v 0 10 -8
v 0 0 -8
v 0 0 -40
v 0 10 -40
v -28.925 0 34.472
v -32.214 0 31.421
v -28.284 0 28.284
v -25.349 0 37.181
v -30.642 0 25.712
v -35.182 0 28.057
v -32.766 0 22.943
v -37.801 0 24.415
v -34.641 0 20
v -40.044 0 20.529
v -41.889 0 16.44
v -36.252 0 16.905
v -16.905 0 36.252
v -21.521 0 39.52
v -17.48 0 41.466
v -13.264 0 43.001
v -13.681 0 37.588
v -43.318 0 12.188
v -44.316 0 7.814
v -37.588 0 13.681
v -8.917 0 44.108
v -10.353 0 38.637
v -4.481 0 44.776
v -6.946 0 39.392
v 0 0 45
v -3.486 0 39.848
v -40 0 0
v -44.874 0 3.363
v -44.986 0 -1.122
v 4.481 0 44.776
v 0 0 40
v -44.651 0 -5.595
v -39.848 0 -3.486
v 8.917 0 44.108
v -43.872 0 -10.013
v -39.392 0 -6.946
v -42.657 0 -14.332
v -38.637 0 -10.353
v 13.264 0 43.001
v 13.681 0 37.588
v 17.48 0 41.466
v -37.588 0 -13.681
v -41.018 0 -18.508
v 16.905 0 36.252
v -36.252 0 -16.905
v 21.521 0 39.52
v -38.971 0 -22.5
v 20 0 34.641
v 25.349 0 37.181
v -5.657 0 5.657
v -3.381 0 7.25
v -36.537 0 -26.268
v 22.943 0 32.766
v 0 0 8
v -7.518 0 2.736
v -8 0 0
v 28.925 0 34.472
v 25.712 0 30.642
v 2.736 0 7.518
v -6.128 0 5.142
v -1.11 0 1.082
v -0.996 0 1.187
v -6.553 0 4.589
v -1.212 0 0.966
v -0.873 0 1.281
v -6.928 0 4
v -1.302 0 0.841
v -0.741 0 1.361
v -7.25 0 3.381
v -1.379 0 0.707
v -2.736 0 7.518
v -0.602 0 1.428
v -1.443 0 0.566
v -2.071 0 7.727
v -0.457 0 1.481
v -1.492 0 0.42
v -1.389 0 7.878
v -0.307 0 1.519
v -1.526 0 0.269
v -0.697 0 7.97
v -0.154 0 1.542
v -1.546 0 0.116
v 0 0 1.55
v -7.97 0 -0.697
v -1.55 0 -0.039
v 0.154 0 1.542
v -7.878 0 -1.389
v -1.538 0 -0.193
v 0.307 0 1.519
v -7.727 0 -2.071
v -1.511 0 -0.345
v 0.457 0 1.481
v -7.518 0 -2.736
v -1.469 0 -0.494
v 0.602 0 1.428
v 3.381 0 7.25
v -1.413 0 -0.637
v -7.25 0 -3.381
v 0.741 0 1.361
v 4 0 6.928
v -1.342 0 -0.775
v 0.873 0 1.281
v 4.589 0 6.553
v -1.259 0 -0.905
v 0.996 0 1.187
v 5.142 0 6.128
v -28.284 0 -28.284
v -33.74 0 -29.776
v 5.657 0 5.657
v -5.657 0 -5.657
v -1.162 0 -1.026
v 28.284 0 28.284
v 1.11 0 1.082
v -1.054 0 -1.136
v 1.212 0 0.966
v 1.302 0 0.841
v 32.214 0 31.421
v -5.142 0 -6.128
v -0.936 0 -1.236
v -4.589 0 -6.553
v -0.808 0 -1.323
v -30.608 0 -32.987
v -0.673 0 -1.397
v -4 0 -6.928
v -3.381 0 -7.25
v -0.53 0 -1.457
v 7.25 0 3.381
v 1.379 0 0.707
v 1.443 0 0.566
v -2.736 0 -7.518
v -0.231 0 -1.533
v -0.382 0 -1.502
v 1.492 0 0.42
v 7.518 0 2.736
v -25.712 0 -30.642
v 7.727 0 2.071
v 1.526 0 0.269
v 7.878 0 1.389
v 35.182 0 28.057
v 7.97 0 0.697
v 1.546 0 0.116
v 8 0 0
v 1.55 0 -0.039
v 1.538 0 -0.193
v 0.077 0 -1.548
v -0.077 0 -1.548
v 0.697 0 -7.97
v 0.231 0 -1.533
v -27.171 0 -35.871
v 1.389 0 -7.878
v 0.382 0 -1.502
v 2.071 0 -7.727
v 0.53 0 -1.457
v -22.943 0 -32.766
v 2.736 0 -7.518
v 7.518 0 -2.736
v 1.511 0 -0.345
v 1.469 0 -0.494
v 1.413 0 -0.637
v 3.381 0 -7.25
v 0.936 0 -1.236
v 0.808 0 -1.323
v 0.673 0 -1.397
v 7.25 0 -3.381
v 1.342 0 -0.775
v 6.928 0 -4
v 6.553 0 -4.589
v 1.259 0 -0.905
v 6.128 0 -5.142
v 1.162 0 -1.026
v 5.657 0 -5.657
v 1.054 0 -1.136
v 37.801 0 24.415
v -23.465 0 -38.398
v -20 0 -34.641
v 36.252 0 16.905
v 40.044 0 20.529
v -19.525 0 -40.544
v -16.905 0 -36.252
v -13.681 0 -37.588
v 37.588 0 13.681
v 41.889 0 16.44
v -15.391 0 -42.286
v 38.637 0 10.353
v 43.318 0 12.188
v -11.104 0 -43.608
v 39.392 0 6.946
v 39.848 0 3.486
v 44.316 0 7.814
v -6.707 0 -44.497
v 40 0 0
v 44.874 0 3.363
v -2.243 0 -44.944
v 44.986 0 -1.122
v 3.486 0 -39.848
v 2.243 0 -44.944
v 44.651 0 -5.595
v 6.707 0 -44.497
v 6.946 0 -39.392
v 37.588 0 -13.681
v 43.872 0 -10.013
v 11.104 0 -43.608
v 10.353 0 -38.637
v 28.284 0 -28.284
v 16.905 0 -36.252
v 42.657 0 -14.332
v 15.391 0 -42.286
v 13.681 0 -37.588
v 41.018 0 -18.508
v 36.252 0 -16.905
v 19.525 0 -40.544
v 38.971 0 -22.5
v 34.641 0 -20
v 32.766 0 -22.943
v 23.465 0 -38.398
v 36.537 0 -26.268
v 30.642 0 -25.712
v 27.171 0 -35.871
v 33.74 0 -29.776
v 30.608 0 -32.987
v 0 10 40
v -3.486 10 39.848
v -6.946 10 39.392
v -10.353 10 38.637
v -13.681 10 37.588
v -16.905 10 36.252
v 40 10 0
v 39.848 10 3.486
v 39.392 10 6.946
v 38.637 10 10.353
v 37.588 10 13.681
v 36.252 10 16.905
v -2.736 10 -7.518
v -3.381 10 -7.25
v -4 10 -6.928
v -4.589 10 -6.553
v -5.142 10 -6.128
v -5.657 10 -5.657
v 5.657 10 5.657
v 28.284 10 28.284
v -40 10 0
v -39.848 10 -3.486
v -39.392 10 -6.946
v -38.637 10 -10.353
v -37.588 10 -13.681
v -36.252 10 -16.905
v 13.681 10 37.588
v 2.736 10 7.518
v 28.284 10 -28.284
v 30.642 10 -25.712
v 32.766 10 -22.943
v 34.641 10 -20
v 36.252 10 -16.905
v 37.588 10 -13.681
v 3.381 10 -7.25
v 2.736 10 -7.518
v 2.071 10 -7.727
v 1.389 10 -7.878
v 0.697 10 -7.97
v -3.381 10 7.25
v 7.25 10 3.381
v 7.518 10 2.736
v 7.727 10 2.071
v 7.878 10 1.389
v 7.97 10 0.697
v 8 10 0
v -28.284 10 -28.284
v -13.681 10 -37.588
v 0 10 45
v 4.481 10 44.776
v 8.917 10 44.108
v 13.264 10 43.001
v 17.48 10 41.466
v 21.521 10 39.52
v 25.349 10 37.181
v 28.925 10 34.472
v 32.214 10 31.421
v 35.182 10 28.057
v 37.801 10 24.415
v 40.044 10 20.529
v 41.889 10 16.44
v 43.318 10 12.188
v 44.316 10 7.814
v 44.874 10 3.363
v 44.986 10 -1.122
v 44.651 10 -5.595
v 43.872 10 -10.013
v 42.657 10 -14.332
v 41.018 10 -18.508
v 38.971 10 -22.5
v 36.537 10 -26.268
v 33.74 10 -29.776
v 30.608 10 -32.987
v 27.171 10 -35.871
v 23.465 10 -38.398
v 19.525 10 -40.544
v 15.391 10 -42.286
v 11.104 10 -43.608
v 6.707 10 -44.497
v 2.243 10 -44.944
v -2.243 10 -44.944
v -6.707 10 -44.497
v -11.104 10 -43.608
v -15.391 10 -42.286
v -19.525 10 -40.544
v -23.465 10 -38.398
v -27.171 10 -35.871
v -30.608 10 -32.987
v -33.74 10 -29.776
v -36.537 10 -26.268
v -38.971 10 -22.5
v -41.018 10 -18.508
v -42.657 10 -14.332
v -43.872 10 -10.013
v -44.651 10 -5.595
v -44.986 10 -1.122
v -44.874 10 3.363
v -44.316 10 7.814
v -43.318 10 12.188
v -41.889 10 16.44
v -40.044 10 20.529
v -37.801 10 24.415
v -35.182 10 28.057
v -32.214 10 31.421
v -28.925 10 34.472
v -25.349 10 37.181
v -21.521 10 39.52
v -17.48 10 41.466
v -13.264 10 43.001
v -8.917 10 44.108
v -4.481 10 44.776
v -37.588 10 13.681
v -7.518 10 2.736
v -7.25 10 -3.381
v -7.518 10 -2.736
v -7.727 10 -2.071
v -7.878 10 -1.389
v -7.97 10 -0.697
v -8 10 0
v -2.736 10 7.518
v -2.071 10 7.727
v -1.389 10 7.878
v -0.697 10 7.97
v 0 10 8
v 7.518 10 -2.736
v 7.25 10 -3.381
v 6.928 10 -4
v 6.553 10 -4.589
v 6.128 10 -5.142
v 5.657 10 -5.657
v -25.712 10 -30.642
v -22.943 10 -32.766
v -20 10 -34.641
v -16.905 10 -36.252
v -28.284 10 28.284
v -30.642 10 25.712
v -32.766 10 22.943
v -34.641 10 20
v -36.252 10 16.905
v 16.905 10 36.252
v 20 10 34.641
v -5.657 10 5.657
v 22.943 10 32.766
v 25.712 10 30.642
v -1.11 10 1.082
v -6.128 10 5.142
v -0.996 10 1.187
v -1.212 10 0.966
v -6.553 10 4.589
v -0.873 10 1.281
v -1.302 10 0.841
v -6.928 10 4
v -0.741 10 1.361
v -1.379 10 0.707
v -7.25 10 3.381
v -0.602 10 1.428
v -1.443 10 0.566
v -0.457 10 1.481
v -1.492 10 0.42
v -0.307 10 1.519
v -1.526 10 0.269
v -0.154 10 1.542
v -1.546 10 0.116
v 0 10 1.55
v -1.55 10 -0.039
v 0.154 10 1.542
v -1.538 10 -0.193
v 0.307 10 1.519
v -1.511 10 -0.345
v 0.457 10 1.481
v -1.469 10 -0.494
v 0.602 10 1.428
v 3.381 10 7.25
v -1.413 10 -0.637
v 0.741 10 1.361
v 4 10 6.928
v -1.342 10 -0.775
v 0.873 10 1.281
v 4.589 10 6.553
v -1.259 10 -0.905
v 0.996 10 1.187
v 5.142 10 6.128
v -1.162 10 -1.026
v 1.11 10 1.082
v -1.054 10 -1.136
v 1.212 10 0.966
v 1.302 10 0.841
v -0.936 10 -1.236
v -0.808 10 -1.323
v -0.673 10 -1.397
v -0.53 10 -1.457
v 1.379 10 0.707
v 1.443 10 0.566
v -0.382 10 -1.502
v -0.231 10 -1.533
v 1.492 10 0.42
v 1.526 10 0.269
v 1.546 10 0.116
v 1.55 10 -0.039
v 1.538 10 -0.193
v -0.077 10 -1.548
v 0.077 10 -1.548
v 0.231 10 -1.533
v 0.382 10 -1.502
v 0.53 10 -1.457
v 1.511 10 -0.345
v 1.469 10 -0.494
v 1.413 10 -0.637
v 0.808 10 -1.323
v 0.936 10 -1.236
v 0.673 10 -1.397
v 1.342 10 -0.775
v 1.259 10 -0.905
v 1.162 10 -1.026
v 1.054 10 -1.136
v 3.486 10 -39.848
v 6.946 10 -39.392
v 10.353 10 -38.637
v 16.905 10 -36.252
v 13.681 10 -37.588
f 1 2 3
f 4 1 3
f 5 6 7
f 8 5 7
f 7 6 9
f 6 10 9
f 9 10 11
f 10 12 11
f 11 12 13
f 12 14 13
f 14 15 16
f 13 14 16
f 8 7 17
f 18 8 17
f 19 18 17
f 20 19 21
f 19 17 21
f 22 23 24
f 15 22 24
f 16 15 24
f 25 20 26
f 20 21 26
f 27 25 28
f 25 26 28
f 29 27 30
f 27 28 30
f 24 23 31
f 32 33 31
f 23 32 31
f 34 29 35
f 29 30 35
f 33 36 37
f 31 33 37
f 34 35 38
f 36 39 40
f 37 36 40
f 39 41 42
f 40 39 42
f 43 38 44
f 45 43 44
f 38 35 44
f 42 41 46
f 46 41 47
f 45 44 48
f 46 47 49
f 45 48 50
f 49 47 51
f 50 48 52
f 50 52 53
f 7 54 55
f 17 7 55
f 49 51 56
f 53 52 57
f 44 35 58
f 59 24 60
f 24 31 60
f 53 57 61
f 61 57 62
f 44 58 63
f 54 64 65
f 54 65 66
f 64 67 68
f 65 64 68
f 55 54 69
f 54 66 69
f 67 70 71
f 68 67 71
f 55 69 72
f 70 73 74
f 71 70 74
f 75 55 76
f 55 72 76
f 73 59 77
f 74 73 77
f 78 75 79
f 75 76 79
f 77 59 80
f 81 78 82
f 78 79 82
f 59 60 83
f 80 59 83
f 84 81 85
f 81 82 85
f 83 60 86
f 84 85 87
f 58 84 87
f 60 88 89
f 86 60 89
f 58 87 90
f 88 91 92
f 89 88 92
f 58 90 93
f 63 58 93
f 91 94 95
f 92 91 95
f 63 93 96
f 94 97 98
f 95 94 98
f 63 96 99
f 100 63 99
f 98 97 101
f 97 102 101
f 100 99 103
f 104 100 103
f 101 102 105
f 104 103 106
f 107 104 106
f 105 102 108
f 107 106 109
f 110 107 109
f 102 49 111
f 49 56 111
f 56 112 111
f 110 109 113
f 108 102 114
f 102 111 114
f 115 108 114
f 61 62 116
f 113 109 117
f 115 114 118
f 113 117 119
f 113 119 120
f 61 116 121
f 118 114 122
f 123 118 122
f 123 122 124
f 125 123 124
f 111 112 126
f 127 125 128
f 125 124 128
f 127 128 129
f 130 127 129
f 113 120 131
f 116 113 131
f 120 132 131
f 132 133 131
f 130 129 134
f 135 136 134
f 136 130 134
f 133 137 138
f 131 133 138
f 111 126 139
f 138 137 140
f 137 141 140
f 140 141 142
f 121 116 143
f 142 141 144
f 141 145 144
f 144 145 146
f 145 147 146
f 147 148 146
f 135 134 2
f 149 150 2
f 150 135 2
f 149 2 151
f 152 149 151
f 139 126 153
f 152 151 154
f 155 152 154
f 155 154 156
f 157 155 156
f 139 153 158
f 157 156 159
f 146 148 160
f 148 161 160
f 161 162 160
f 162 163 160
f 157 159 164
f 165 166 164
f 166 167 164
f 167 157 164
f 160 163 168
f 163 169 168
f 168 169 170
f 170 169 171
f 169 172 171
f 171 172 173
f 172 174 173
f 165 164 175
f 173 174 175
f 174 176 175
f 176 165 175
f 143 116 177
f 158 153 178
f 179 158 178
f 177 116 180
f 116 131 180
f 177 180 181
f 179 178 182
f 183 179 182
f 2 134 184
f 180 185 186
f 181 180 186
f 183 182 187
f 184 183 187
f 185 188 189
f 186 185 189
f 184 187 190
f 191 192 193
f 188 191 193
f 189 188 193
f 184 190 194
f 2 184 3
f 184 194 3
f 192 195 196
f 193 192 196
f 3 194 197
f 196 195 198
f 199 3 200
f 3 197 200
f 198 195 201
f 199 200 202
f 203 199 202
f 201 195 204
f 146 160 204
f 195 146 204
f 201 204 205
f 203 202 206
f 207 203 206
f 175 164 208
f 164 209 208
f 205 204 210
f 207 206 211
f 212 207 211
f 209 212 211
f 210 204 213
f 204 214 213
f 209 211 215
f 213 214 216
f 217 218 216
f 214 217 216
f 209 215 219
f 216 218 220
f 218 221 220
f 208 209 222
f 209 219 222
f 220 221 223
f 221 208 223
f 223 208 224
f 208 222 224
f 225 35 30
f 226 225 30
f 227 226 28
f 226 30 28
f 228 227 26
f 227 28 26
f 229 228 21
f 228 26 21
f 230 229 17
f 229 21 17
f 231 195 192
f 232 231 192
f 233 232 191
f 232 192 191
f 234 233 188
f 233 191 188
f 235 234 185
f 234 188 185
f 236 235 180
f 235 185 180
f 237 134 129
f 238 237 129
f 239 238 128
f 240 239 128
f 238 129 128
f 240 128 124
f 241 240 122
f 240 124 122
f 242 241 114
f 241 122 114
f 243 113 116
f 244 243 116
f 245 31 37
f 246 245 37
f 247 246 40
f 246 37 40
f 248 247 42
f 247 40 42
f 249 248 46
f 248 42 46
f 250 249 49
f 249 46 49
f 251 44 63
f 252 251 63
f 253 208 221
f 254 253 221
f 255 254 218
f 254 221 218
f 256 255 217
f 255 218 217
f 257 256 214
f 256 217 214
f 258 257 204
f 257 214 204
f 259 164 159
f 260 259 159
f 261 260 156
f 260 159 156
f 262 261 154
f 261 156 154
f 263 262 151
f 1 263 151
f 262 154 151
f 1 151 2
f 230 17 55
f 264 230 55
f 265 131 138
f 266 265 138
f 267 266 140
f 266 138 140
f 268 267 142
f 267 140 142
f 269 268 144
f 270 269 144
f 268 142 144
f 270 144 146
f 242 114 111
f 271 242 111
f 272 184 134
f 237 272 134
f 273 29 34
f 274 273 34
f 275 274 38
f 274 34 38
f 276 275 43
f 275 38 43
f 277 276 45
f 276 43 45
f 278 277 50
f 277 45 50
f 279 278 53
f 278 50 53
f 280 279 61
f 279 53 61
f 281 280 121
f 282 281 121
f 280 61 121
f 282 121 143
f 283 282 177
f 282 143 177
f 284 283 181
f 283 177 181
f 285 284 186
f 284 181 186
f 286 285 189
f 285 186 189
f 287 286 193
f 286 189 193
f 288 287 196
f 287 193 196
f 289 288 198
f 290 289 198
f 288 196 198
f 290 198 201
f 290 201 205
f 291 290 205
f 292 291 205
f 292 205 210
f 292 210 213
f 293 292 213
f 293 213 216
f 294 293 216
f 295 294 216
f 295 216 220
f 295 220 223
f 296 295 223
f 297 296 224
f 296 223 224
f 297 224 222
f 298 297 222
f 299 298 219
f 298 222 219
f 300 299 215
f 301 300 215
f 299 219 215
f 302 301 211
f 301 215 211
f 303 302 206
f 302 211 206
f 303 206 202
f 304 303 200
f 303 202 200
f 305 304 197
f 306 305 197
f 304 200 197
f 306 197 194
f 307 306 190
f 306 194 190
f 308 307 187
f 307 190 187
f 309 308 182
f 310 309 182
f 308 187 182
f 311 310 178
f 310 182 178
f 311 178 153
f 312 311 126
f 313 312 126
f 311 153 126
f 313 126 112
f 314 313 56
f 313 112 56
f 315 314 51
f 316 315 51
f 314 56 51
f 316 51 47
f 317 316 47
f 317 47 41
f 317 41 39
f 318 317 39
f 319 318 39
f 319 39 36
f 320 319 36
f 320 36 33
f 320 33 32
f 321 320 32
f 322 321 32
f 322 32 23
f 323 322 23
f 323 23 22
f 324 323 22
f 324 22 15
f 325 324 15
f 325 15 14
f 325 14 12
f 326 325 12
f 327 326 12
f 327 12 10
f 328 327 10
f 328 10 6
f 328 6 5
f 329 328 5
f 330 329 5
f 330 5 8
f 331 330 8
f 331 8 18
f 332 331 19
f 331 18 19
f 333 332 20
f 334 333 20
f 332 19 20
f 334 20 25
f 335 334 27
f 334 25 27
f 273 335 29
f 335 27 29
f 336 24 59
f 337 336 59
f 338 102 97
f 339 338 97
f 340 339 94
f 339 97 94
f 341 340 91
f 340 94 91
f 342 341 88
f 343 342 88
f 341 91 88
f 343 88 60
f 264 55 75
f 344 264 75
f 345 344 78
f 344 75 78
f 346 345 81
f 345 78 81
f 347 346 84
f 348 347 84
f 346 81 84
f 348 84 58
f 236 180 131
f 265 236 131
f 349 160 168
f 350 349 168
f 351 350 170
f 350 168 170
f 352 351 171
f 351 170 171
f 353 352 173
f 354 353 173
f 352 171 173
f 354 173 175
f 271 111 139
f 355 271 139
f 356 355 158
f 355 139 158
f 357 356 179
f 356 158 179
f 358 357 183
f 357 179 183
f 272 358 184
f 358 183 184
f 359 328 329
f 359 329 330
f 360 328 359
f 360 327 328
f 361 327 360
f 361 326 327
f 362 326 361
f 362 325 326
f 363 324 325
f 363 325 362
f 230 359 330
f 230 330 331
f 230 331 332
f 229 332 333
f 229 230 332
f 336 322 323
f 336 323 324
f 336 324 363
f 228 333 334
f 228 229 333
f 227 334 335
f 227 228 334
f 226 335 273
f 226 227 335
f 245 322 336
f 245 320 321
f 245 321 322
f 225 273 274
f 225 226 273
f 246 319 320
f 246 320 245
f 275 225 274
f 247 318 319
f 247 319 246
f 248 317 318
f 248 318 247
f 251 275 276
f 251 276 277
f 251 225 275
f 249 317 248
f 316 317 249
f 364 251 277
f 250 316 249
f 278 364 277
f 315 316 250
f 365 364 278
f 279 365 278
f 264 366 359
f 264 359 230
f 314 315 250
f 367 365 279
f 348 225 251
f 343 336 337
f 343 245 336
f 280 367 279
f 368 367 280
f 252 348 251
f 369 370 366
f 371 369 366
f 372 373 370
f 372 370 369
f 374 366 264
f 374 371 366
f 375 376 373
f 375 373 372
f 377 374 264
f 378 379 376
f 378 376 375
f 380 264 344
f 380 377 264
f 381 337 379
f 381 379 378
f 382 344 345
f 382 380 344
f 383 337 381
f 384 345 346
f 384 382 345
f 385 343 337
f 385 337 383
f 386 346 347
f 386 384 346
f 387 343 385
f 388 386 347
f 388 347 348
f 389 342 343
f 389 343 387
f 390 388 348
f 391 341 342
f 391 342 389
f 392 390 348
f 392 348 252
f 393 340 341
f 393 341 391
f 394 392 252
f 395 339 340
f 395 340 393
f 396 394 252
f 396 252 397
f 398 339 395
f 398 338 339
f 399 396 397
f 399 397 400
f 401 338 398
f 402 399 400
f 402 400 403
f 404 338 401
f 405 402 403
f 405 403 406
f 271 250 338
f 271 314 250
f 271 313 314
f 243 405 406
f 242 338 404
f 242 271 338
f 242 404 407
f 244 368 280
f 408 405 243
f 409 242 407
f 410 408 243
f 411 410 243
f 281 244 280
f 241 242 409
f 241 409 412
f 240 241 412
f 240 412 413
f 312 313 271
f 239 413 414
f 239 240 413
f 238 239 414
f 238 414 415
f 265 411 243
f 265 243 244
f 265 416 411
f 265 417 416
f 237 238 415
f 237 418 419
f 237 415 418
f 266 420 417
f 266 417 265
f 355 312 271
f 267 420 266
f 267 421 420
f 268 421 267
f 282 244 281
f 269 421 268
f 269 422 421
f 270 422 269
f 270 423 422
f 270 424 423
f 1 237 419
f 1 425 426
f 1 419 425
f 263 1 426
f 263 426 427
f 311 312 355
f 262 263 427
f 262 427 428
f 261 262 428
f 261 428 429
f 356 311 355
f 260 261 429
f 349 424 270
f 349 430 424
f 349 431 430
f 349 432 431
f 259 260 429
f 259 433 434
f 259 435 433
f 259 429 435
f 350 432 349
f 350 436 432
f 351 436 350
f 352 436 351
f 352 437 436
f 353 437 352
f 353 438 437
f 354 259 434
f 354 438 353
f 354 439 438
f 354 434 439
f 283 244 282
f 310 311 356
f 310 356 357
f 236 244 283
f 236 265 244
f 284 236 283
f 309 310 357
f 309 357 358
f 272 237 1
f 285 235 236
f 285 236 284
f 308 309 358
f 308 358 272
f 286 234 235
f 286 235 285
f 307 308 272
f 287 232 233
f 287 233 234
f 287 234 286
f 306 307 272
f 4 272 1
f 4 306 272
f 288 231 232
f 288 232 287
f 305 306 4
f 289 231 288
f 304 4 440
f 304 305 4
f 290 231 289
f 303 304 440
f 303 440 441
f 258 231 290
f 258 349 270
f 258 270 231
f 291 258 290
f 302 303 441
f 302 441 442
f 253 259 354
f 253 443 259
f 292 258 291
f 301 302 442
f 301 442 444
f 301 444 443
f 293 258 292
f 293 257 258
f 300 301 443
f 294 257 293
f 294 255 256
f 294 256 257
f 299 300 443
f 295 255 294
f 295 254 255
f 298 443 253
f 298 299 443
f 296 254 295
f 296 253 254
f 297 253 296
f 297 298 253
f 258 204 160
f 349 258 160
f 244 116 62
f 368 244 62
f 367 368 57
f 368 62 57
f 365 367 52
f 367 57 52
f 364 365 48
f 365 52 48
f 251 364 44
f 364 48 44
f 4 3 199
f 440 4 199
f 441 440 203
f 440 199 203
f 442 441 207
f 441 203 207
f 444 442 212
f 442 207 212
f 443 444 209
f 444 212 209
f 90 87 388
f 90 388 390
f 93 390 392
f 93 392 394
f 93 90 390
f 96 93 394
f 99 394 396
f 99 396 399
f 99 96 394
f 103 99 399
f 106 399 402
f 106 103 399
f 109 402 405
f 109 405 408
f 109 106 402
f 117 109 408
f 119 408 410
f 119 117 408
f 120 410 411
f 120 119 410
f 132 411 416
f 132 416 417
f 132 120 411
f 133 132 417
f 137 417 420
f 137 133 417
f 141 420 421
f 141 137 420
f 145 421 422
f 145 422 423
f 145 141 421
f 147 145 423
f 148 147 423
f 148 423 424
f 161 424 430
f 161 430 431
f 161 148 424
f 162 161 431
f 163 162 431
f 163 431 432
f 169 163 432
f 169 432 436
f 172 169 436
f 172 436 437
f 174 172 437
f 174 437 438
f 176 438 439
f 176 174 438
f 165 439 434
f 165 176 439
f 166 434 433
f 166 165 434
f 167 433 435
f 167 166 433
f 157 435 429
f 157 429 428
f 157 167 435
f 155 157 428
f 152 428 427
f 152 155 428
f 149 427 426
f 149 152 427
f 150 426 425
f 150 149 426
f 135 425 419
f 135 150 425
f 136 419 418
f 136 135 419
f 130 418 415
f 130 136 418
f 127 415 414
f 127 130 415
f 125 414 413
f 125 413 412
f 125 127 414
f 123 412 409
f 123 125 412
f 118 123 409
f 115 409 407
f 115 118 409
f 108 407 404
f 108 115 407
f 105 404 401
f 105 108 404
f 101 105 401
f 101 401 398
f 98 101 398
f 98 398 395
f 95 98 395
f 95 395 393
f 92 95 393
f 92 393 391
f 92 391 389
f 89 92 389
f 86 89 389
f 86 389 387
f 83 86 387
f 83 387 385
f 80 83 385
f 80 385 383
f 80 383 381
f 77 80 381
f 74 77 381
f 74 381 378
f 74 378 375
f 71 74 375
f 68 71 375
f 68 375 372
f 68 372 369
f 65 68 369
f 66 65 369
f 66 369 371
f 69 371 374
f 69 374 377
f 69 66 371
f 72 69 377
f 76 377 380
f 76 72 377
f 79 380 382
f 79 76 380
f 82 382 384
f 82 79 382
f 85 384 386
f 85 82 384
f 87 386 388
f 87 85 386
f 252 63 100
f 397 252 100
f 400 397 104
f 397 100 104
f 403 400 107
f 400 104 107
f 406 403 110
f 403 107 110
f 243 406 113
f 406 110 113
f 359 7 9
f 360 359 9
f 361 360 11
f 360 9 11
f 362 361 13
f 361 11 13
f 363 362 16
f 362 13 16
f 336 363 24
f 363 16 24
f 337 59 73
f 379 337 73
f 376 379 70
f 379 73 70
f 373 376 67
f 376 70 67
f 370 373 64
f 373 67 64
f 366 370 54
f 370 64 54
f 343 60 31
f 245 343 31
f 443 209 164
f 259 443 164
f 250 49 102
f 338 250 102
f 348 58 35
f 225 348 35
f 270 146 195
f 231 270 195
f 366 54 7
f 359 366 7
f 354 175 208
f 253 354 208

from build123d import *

# Parameters (mm, degrees)
SKETCH1_R           = 45
SKETCH1_R_2         = 8
SKETCH1_R_3         = 1.55
BOSS_EXTRUDE1_DEPTH = 10


with BuildPart() as part:
    # Sketch1 → Boss-Extrude1 (new body)
    # profile 1 of 2: a face of its own
    with BuildSketch(Plane(origin=(0, 0, 0), x_dir=(1, 0, 0), z_dir=(0, 1, 0))):
        with Locations(Location((0, 0, 0), (0, 0, 270))):
            Circle(SKETCH1_R)
        with BuildLine():
            Line((0, 8), (0, 40))
            ThreePointArc((0, 40), (8.657584558, 39.051840285), (16.90473047, 36.252311481))
            Line((16.90473047, 36.252311481), (3.380946094, 7.250462296))
            ThreePointArc((3.380946094, 7.250462296), (4.588611491, 6.553216354), (5.656854249, 5.656854249))
            Line((5.656854249, 5.656854249), (28.284271247, 28.284271247))
            ThreePointArc((28.284271247, 28.284271247), (33.735657833, 21.491984334), (37.587704831, 13.680805733))
            Line((37.587704831, 13.680805733), (7.517540966, 2.736161147))
            ThreePointArc((7.517540966, 2.736161147), (7.878462024, 1.389185421), (8, 0))
            Line((8, 0), (40, 0))
            ThreePointArc((40, 0), (39.051840285, -8.657584558), (36.252311481, -16.90473047))
            Line((36.252311481, -16.90473047), (7.250462296, -3.380946094))
            ThreePointArc((7.250462296, -3.380946094), (6.553216354, -4.588611491), (5.656854249, -5.656854249))
            Line((5.656854249, -5.656854249), (28.284271247, -28.284271247))
            ThreePointArc((28.284271247, -28.284271247), (21.491984334, -33.735657833), (13.680805733, -37.587704831))
            Line((13.680805733, -37.587704831), (2.736161147, -7.517540966))
            ThreePointArc((2.736161147, -7.517540966), (1.389185421, -7.878462024), (0, -8))
            Line((0, -8), (0, -40))
            ThreePointArc((0, -40), (-8.657584558, -39.051840285), (-16.90473047, -36.252311481))
            Line((-16.90473047, -36.252311481), (-3.380946094, -7.250462296))
            ThreePointArc((-3.380946094, -7.250462296), (-4.588611491, -6.553216354), (-5.656854249, -5.656854249))
            Line((-5.656854249, -5.656854249), (-28.284271247, -28.284271247))
            ThreePointArc((-28.284271247, -28.284271247), (-33.735657833, -21.491984334), (-37.587704831, -13.680805733))
            Line((-37.587704831, -13.680805733), (-7.517540966, -2.736161147))
            ThreePointArc((-7.517540966, -2.736161147), (-7.878462024, -1.389185421), (-8, 0))
            Line((-8, 0), (-40, 0))
            ThreePointArc((-40, 0), (-39.051840285, 8.657584558), (-36.252311481, 16.90473047))
            Line((-36.252311481, 16.90473047), (-7.250462296, 3.380946094))
            ThreePointArc((-7.250462296, 3.380946094), (-6.553216354, 4.588611491), (-5.656854249, 5.656854249))
            Line((-5.656854249, 5.656854249), (-28.284271247, 28.284271247))
            ThreePointArc((-28.284271247, 28.284271247), (-21.491984334, 33.735657833), (-13.680805733, 37.587704831))
            Line((-13.680805733, 37.587704831), (-2.736161147, 7.517540966))
            ThreePointArc((-2.736161147, 7.517540966), (-1.389185421, 7.878462024), (0, 8))
        make_face(mode=Mode.SUBTRACT)
    # profile 2 of 2: a face of its own
    with BuildSketch(Plane(origin=(0, 0, 0), x_dir=(1, 0, 0), z_dir=(0, 1, 0))):
        Circle(SKETCH1_R_2)
        with Locations(Location((0, 0, 0), (0, 0, 270))):
            Circle(SKETCH1_R_3, mode=Mode.SUBTRACT)
    extrude(amount=BOSS_EXTRUDE1_DEPTH)


solid = part.part
